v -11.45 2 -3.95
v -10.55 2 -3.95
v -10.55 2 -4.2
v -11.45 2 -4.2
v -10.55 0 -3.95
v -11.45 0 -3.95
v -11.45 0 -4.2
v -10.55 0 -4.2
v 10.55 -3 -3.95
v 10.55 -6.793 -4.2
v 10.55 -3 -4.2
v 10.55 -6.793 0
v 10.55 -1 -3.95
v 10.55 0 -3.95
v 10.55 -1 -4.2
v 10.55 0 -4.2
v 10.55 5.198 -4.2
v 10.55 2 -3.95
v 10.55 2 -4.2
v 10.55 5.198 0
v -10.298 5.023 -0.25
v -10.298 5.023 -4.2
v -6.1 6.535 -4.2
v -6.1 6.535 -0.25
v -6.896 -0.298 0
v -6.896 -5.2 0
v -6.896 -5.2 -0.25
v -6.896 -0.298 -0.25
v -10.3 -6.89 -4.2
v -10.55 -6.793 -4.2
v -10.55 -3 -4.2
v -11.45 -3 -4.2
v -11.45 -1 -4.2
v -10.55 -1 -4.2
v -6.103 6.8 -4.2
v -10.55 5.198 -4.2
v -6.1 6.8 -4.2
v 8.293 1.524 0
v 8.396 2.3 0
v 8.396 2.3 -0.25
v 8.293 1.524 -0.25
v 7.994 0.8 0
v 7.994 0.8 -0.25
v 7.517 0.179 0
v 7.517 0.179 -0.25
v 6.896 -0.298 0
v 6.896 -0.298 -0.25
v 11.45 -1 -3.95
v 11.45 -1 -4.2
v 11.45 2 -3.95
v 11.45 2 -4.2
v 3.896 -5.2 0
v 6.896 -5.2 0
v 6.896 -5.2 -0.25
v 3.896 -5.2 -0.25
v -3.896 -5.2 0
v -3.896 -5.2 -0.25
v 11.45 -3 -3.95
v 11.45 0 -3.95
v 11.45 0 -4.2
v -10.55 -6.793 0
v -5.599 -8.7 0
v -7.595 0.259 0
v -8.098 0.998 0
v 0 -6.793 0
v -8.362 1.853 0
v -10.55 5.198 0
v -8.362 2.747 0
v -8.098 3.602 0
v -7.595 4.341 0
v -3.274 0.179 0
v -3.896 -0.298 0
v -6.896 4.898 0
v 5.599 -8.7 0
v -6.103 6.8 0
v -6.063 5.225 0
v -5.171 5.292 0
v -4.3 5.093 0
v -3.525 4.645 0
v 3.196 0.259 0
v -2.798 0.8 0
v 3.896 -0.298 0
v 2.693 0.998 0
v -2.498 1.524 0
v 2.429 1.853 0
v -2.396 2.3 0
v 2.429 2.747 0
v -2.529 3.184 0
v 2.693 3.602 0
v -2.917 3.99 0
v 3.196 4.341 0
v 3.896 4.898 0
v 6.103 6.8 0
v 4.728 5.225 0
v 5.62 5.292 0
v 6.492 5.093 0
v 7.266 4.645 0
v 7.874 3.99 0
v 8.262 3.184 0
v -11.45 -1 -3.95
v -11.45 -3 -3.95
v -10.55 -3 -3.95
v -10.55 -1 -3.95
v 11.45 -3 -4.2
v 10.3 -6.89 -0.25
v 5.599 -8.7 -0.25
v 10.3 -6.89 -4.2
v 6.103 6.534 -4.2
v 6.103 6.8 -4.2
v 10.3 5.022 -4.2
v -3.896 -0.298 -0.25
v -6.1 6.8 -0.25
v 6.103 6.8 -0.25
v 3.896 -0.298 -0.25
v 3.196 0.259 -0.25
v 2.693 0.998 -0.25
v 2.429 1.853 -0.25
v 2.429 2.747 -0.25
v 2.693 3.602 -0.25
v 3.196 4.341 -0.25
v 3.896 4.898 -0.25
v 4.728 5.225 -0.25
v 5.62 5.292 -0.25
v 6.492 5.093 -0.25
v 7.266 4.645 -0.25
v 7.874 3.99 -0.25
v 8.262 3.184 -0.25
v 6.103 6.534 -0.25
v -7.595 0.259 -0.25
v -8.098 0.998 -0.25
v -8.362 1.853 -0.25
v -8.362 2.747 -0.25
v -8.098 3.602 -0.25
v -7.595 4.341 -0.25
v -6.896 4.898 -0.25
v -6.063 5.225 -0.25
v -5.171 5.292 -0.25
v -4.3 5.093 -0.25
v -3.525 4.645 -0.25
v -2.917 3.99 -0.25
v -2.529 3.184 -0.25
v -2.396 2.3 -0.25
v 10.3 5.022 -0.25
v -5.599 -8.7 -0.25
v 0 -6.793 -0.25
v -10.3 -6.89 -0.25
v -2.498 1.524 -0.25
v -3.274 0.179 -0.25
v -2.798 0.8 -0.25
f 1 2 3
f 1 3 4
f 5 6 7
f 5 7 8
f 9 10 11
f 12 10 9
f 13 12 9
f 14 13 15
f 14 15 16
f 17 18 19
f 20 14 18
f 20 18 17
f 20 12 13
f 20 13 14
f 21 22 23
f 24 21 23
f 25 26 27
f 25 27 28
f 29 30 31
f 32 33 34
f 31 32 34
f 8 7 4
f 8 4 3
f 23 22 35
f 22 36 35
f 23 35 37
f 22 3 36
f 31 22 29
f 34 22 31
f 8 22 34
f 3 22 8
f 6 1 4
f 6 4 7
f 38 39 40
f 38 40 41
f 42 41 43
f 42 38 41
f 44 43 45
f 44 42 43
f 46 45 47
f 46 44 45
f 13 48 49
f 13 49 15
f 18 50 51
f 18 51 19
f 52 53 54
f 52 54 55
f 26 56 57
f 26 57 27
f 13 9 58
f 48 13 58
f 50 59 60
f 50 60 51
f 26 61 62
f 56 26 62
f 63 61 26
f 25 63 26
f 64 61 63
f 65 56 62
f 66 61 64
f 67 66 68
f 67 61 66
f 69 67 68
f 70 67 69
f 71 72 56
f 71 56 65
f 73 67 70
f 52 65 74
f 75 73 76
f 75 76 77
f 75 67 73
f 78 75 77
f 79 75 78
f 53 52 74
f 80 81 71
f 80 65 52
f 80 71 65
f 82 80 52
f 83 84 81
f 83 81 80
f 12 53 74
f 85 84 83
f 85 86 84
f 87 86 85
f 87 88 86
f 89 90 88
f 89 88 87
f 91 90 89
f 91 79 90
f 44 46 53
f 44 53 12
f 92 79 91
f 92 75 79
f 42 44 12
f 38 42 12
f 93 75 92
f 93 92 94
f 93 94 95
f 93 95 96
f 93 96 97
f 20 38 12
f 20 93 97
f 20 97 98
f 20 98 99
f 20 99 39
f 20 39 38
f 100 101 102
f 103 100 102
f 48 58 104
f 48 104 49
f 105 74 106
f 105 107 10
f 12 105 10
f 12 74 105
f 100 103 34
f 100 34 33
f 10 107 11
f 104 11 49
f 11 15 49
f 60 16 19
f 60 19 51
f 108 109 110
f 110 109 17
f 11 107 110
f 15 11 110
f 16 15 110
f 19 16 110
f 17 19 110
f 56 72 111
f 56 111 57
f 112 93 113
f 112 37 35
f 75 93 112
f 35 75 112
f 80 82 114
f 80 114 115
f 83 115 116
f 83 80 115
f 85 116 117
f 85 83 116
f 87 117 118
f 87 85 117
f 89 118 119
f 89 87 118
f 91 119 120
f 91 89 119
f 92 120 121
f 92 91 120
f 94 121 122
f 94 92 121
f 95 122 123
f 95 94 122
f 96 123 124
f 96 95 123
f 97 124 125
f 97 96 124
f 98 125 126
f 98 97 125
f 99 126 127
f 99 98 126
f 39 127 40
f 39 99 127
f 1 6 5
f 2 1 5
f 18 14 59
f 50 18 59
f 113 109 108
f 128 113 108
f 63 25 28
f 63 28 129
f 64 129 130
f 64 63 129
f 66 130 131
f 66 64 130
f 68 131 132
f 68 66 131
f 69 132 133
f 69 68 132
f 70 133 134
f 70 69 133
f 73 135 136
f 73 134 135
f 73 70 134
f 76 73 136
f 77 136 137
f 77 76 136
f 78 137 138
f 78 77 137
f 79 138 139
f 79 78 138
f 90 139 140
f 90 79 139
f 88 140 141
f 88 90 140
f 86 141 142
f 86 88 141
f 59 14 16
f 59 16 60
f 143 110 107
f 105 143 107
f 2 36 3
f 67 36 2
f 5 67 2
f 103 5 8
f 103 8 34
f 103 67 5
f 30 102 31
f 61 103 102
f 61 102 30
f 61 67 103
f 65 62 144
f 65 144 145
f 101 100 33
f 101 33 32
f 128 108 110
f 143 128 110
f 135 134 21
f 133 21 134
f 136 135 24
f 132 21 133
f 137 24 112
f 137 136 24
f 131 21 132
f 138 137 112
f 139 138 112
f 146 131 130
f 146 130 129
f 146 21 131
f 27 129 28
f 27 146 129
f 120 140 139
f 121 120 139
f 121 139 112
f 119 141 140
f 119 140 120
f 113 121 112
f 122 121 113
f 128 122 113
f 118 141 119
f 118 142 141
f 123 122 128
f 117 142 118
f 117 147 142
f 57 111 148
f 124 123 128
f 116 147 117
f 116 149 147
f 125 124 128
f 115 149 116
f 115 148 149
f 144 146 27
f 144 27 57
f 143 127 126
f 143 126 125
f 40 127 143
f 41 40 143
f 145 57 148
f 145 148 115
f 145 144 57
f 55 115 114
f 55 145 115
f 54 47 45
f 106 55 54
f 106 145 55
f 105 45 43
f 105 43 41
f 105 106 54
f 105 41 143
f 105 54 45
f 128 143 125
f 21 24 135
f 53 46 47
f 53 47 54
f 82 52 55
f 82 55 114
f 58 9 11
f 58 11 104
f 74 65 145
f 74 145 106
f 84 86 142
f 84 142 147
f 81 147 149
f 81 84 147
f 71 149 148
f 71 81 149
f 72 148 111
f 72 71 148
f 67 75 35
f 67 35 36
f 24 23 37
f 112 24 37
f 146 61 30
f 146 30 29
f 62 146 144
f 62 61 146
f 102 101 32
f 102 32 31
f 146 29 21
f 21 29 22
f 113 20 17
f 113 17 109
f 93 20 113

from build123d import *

# Parameters (mm, degrees)
F1_DEPTH = 4.2
F3_DEPTH = 3.95
F4_W     = 0.9
F4_H     = 3.95
F5_DEPTH = 9.801


with BuildPart() as f1:
    # F0 (on Top) → F1 (new body)
    with BuildSketch(Plane.XY):
        Polygon((-6.102773, 6.8), (-10.55, 5.197539), (-10.55, 2), (-11.45, 2), (-11.45, 0), (-10.55, 0), (-10.55, -1), (-11.45, -1), (-11.45, -3), (-10.55, -3), (-10.55, -6.793472), (-5.599174, -8.7), (0, -6.793472), (0, 0), (0, 6.8), align=None)
        with BuildLine():
            ThreePointArc((-6.895583, -0.298076), (-6.895583, 4.898076), (-2.395583, 2.3))
            ThreePointArc((-2.395583, 2.3), (-2.797507, 0.8), (-3.895583, -0.298076))
            Line((-3.895583, -0.298076), (-3.895583, -5.2))
            Line((-3.895583, -5.2), (-5.395583, -5.2))
            Line((-5.395583, -5.2), (-6.895583, -5.2))
            Line((-6.895583, -5.2), (-6.895583, -0.298076))
        make_face(mode=Mode.SUBTRACT)
        Polygon((6.102773, 6.8), (0, 6.8), (0, 0), (0, -6.793472), (5.599174, -8.7), (10.55, -6.793472), (10.55, -3), (11.45, -3), (11.45, -1), (10.55, -1), (10.55, 0), (11.45, 0), (11.45, 2), (10.55, 2), (10.55, 5.197539), align=None)
        with BuildLine():
            ThreePointArc((3.895583, -0.298076), (3.895583, 4.898076), (8.395583, 2.3))
            ThreePointArc((8.395583, 2.3), (7.99366, 0.8), (6.895583, -0.298076))
            Line((6.895583, -0.298076), (6.895583, -5.2))
            Line((6.895583, -5.2), (5.395583, -5.2))
            Line((5.395583, -5.2), (3.895583, -5.2))
            Line((3.895583, -5.2), (3.895583, -0.298076))
        make_face(mode=Mode.SUBTRACT)
    extrude(amount=-F1_DEPTH)

    # F2 (on face) → F3 (cut)
    with BuildSketch(Plane(origin=(0, 0, -4.2), x_dir=(1, 0, 0), z_dir=(0, 0, -1))):
        Polygon((10.3, -5.021887), (10.3, 9.377568), (0, 9.377568), (-10.3, 9.37597), (-10.297766, -5.023484), (-6.100304, -6.535212), (-6.099994, -8.536118), (0.001405, -8.73276), (6.102773, -8.535172), (6.102773, -6.534266), align=None)
    extrude(amount=-F3_DEPTH, mode=Mode.SUBTRACT)

    # F4 (on face) → F5 (cut, through all)
    with BuildSketch(Plane.XZ.offset(3)):
        with Locations((-11, -1.975)):
            Rectangle(F4_W, F4_H)
        with Locations((11, -1.975)):
            Rectangle(F4_W, F4_H)
    extrude(amount=-F5_DEPTH, mode=Mode.SUBTRACT)


solid = f1.part
